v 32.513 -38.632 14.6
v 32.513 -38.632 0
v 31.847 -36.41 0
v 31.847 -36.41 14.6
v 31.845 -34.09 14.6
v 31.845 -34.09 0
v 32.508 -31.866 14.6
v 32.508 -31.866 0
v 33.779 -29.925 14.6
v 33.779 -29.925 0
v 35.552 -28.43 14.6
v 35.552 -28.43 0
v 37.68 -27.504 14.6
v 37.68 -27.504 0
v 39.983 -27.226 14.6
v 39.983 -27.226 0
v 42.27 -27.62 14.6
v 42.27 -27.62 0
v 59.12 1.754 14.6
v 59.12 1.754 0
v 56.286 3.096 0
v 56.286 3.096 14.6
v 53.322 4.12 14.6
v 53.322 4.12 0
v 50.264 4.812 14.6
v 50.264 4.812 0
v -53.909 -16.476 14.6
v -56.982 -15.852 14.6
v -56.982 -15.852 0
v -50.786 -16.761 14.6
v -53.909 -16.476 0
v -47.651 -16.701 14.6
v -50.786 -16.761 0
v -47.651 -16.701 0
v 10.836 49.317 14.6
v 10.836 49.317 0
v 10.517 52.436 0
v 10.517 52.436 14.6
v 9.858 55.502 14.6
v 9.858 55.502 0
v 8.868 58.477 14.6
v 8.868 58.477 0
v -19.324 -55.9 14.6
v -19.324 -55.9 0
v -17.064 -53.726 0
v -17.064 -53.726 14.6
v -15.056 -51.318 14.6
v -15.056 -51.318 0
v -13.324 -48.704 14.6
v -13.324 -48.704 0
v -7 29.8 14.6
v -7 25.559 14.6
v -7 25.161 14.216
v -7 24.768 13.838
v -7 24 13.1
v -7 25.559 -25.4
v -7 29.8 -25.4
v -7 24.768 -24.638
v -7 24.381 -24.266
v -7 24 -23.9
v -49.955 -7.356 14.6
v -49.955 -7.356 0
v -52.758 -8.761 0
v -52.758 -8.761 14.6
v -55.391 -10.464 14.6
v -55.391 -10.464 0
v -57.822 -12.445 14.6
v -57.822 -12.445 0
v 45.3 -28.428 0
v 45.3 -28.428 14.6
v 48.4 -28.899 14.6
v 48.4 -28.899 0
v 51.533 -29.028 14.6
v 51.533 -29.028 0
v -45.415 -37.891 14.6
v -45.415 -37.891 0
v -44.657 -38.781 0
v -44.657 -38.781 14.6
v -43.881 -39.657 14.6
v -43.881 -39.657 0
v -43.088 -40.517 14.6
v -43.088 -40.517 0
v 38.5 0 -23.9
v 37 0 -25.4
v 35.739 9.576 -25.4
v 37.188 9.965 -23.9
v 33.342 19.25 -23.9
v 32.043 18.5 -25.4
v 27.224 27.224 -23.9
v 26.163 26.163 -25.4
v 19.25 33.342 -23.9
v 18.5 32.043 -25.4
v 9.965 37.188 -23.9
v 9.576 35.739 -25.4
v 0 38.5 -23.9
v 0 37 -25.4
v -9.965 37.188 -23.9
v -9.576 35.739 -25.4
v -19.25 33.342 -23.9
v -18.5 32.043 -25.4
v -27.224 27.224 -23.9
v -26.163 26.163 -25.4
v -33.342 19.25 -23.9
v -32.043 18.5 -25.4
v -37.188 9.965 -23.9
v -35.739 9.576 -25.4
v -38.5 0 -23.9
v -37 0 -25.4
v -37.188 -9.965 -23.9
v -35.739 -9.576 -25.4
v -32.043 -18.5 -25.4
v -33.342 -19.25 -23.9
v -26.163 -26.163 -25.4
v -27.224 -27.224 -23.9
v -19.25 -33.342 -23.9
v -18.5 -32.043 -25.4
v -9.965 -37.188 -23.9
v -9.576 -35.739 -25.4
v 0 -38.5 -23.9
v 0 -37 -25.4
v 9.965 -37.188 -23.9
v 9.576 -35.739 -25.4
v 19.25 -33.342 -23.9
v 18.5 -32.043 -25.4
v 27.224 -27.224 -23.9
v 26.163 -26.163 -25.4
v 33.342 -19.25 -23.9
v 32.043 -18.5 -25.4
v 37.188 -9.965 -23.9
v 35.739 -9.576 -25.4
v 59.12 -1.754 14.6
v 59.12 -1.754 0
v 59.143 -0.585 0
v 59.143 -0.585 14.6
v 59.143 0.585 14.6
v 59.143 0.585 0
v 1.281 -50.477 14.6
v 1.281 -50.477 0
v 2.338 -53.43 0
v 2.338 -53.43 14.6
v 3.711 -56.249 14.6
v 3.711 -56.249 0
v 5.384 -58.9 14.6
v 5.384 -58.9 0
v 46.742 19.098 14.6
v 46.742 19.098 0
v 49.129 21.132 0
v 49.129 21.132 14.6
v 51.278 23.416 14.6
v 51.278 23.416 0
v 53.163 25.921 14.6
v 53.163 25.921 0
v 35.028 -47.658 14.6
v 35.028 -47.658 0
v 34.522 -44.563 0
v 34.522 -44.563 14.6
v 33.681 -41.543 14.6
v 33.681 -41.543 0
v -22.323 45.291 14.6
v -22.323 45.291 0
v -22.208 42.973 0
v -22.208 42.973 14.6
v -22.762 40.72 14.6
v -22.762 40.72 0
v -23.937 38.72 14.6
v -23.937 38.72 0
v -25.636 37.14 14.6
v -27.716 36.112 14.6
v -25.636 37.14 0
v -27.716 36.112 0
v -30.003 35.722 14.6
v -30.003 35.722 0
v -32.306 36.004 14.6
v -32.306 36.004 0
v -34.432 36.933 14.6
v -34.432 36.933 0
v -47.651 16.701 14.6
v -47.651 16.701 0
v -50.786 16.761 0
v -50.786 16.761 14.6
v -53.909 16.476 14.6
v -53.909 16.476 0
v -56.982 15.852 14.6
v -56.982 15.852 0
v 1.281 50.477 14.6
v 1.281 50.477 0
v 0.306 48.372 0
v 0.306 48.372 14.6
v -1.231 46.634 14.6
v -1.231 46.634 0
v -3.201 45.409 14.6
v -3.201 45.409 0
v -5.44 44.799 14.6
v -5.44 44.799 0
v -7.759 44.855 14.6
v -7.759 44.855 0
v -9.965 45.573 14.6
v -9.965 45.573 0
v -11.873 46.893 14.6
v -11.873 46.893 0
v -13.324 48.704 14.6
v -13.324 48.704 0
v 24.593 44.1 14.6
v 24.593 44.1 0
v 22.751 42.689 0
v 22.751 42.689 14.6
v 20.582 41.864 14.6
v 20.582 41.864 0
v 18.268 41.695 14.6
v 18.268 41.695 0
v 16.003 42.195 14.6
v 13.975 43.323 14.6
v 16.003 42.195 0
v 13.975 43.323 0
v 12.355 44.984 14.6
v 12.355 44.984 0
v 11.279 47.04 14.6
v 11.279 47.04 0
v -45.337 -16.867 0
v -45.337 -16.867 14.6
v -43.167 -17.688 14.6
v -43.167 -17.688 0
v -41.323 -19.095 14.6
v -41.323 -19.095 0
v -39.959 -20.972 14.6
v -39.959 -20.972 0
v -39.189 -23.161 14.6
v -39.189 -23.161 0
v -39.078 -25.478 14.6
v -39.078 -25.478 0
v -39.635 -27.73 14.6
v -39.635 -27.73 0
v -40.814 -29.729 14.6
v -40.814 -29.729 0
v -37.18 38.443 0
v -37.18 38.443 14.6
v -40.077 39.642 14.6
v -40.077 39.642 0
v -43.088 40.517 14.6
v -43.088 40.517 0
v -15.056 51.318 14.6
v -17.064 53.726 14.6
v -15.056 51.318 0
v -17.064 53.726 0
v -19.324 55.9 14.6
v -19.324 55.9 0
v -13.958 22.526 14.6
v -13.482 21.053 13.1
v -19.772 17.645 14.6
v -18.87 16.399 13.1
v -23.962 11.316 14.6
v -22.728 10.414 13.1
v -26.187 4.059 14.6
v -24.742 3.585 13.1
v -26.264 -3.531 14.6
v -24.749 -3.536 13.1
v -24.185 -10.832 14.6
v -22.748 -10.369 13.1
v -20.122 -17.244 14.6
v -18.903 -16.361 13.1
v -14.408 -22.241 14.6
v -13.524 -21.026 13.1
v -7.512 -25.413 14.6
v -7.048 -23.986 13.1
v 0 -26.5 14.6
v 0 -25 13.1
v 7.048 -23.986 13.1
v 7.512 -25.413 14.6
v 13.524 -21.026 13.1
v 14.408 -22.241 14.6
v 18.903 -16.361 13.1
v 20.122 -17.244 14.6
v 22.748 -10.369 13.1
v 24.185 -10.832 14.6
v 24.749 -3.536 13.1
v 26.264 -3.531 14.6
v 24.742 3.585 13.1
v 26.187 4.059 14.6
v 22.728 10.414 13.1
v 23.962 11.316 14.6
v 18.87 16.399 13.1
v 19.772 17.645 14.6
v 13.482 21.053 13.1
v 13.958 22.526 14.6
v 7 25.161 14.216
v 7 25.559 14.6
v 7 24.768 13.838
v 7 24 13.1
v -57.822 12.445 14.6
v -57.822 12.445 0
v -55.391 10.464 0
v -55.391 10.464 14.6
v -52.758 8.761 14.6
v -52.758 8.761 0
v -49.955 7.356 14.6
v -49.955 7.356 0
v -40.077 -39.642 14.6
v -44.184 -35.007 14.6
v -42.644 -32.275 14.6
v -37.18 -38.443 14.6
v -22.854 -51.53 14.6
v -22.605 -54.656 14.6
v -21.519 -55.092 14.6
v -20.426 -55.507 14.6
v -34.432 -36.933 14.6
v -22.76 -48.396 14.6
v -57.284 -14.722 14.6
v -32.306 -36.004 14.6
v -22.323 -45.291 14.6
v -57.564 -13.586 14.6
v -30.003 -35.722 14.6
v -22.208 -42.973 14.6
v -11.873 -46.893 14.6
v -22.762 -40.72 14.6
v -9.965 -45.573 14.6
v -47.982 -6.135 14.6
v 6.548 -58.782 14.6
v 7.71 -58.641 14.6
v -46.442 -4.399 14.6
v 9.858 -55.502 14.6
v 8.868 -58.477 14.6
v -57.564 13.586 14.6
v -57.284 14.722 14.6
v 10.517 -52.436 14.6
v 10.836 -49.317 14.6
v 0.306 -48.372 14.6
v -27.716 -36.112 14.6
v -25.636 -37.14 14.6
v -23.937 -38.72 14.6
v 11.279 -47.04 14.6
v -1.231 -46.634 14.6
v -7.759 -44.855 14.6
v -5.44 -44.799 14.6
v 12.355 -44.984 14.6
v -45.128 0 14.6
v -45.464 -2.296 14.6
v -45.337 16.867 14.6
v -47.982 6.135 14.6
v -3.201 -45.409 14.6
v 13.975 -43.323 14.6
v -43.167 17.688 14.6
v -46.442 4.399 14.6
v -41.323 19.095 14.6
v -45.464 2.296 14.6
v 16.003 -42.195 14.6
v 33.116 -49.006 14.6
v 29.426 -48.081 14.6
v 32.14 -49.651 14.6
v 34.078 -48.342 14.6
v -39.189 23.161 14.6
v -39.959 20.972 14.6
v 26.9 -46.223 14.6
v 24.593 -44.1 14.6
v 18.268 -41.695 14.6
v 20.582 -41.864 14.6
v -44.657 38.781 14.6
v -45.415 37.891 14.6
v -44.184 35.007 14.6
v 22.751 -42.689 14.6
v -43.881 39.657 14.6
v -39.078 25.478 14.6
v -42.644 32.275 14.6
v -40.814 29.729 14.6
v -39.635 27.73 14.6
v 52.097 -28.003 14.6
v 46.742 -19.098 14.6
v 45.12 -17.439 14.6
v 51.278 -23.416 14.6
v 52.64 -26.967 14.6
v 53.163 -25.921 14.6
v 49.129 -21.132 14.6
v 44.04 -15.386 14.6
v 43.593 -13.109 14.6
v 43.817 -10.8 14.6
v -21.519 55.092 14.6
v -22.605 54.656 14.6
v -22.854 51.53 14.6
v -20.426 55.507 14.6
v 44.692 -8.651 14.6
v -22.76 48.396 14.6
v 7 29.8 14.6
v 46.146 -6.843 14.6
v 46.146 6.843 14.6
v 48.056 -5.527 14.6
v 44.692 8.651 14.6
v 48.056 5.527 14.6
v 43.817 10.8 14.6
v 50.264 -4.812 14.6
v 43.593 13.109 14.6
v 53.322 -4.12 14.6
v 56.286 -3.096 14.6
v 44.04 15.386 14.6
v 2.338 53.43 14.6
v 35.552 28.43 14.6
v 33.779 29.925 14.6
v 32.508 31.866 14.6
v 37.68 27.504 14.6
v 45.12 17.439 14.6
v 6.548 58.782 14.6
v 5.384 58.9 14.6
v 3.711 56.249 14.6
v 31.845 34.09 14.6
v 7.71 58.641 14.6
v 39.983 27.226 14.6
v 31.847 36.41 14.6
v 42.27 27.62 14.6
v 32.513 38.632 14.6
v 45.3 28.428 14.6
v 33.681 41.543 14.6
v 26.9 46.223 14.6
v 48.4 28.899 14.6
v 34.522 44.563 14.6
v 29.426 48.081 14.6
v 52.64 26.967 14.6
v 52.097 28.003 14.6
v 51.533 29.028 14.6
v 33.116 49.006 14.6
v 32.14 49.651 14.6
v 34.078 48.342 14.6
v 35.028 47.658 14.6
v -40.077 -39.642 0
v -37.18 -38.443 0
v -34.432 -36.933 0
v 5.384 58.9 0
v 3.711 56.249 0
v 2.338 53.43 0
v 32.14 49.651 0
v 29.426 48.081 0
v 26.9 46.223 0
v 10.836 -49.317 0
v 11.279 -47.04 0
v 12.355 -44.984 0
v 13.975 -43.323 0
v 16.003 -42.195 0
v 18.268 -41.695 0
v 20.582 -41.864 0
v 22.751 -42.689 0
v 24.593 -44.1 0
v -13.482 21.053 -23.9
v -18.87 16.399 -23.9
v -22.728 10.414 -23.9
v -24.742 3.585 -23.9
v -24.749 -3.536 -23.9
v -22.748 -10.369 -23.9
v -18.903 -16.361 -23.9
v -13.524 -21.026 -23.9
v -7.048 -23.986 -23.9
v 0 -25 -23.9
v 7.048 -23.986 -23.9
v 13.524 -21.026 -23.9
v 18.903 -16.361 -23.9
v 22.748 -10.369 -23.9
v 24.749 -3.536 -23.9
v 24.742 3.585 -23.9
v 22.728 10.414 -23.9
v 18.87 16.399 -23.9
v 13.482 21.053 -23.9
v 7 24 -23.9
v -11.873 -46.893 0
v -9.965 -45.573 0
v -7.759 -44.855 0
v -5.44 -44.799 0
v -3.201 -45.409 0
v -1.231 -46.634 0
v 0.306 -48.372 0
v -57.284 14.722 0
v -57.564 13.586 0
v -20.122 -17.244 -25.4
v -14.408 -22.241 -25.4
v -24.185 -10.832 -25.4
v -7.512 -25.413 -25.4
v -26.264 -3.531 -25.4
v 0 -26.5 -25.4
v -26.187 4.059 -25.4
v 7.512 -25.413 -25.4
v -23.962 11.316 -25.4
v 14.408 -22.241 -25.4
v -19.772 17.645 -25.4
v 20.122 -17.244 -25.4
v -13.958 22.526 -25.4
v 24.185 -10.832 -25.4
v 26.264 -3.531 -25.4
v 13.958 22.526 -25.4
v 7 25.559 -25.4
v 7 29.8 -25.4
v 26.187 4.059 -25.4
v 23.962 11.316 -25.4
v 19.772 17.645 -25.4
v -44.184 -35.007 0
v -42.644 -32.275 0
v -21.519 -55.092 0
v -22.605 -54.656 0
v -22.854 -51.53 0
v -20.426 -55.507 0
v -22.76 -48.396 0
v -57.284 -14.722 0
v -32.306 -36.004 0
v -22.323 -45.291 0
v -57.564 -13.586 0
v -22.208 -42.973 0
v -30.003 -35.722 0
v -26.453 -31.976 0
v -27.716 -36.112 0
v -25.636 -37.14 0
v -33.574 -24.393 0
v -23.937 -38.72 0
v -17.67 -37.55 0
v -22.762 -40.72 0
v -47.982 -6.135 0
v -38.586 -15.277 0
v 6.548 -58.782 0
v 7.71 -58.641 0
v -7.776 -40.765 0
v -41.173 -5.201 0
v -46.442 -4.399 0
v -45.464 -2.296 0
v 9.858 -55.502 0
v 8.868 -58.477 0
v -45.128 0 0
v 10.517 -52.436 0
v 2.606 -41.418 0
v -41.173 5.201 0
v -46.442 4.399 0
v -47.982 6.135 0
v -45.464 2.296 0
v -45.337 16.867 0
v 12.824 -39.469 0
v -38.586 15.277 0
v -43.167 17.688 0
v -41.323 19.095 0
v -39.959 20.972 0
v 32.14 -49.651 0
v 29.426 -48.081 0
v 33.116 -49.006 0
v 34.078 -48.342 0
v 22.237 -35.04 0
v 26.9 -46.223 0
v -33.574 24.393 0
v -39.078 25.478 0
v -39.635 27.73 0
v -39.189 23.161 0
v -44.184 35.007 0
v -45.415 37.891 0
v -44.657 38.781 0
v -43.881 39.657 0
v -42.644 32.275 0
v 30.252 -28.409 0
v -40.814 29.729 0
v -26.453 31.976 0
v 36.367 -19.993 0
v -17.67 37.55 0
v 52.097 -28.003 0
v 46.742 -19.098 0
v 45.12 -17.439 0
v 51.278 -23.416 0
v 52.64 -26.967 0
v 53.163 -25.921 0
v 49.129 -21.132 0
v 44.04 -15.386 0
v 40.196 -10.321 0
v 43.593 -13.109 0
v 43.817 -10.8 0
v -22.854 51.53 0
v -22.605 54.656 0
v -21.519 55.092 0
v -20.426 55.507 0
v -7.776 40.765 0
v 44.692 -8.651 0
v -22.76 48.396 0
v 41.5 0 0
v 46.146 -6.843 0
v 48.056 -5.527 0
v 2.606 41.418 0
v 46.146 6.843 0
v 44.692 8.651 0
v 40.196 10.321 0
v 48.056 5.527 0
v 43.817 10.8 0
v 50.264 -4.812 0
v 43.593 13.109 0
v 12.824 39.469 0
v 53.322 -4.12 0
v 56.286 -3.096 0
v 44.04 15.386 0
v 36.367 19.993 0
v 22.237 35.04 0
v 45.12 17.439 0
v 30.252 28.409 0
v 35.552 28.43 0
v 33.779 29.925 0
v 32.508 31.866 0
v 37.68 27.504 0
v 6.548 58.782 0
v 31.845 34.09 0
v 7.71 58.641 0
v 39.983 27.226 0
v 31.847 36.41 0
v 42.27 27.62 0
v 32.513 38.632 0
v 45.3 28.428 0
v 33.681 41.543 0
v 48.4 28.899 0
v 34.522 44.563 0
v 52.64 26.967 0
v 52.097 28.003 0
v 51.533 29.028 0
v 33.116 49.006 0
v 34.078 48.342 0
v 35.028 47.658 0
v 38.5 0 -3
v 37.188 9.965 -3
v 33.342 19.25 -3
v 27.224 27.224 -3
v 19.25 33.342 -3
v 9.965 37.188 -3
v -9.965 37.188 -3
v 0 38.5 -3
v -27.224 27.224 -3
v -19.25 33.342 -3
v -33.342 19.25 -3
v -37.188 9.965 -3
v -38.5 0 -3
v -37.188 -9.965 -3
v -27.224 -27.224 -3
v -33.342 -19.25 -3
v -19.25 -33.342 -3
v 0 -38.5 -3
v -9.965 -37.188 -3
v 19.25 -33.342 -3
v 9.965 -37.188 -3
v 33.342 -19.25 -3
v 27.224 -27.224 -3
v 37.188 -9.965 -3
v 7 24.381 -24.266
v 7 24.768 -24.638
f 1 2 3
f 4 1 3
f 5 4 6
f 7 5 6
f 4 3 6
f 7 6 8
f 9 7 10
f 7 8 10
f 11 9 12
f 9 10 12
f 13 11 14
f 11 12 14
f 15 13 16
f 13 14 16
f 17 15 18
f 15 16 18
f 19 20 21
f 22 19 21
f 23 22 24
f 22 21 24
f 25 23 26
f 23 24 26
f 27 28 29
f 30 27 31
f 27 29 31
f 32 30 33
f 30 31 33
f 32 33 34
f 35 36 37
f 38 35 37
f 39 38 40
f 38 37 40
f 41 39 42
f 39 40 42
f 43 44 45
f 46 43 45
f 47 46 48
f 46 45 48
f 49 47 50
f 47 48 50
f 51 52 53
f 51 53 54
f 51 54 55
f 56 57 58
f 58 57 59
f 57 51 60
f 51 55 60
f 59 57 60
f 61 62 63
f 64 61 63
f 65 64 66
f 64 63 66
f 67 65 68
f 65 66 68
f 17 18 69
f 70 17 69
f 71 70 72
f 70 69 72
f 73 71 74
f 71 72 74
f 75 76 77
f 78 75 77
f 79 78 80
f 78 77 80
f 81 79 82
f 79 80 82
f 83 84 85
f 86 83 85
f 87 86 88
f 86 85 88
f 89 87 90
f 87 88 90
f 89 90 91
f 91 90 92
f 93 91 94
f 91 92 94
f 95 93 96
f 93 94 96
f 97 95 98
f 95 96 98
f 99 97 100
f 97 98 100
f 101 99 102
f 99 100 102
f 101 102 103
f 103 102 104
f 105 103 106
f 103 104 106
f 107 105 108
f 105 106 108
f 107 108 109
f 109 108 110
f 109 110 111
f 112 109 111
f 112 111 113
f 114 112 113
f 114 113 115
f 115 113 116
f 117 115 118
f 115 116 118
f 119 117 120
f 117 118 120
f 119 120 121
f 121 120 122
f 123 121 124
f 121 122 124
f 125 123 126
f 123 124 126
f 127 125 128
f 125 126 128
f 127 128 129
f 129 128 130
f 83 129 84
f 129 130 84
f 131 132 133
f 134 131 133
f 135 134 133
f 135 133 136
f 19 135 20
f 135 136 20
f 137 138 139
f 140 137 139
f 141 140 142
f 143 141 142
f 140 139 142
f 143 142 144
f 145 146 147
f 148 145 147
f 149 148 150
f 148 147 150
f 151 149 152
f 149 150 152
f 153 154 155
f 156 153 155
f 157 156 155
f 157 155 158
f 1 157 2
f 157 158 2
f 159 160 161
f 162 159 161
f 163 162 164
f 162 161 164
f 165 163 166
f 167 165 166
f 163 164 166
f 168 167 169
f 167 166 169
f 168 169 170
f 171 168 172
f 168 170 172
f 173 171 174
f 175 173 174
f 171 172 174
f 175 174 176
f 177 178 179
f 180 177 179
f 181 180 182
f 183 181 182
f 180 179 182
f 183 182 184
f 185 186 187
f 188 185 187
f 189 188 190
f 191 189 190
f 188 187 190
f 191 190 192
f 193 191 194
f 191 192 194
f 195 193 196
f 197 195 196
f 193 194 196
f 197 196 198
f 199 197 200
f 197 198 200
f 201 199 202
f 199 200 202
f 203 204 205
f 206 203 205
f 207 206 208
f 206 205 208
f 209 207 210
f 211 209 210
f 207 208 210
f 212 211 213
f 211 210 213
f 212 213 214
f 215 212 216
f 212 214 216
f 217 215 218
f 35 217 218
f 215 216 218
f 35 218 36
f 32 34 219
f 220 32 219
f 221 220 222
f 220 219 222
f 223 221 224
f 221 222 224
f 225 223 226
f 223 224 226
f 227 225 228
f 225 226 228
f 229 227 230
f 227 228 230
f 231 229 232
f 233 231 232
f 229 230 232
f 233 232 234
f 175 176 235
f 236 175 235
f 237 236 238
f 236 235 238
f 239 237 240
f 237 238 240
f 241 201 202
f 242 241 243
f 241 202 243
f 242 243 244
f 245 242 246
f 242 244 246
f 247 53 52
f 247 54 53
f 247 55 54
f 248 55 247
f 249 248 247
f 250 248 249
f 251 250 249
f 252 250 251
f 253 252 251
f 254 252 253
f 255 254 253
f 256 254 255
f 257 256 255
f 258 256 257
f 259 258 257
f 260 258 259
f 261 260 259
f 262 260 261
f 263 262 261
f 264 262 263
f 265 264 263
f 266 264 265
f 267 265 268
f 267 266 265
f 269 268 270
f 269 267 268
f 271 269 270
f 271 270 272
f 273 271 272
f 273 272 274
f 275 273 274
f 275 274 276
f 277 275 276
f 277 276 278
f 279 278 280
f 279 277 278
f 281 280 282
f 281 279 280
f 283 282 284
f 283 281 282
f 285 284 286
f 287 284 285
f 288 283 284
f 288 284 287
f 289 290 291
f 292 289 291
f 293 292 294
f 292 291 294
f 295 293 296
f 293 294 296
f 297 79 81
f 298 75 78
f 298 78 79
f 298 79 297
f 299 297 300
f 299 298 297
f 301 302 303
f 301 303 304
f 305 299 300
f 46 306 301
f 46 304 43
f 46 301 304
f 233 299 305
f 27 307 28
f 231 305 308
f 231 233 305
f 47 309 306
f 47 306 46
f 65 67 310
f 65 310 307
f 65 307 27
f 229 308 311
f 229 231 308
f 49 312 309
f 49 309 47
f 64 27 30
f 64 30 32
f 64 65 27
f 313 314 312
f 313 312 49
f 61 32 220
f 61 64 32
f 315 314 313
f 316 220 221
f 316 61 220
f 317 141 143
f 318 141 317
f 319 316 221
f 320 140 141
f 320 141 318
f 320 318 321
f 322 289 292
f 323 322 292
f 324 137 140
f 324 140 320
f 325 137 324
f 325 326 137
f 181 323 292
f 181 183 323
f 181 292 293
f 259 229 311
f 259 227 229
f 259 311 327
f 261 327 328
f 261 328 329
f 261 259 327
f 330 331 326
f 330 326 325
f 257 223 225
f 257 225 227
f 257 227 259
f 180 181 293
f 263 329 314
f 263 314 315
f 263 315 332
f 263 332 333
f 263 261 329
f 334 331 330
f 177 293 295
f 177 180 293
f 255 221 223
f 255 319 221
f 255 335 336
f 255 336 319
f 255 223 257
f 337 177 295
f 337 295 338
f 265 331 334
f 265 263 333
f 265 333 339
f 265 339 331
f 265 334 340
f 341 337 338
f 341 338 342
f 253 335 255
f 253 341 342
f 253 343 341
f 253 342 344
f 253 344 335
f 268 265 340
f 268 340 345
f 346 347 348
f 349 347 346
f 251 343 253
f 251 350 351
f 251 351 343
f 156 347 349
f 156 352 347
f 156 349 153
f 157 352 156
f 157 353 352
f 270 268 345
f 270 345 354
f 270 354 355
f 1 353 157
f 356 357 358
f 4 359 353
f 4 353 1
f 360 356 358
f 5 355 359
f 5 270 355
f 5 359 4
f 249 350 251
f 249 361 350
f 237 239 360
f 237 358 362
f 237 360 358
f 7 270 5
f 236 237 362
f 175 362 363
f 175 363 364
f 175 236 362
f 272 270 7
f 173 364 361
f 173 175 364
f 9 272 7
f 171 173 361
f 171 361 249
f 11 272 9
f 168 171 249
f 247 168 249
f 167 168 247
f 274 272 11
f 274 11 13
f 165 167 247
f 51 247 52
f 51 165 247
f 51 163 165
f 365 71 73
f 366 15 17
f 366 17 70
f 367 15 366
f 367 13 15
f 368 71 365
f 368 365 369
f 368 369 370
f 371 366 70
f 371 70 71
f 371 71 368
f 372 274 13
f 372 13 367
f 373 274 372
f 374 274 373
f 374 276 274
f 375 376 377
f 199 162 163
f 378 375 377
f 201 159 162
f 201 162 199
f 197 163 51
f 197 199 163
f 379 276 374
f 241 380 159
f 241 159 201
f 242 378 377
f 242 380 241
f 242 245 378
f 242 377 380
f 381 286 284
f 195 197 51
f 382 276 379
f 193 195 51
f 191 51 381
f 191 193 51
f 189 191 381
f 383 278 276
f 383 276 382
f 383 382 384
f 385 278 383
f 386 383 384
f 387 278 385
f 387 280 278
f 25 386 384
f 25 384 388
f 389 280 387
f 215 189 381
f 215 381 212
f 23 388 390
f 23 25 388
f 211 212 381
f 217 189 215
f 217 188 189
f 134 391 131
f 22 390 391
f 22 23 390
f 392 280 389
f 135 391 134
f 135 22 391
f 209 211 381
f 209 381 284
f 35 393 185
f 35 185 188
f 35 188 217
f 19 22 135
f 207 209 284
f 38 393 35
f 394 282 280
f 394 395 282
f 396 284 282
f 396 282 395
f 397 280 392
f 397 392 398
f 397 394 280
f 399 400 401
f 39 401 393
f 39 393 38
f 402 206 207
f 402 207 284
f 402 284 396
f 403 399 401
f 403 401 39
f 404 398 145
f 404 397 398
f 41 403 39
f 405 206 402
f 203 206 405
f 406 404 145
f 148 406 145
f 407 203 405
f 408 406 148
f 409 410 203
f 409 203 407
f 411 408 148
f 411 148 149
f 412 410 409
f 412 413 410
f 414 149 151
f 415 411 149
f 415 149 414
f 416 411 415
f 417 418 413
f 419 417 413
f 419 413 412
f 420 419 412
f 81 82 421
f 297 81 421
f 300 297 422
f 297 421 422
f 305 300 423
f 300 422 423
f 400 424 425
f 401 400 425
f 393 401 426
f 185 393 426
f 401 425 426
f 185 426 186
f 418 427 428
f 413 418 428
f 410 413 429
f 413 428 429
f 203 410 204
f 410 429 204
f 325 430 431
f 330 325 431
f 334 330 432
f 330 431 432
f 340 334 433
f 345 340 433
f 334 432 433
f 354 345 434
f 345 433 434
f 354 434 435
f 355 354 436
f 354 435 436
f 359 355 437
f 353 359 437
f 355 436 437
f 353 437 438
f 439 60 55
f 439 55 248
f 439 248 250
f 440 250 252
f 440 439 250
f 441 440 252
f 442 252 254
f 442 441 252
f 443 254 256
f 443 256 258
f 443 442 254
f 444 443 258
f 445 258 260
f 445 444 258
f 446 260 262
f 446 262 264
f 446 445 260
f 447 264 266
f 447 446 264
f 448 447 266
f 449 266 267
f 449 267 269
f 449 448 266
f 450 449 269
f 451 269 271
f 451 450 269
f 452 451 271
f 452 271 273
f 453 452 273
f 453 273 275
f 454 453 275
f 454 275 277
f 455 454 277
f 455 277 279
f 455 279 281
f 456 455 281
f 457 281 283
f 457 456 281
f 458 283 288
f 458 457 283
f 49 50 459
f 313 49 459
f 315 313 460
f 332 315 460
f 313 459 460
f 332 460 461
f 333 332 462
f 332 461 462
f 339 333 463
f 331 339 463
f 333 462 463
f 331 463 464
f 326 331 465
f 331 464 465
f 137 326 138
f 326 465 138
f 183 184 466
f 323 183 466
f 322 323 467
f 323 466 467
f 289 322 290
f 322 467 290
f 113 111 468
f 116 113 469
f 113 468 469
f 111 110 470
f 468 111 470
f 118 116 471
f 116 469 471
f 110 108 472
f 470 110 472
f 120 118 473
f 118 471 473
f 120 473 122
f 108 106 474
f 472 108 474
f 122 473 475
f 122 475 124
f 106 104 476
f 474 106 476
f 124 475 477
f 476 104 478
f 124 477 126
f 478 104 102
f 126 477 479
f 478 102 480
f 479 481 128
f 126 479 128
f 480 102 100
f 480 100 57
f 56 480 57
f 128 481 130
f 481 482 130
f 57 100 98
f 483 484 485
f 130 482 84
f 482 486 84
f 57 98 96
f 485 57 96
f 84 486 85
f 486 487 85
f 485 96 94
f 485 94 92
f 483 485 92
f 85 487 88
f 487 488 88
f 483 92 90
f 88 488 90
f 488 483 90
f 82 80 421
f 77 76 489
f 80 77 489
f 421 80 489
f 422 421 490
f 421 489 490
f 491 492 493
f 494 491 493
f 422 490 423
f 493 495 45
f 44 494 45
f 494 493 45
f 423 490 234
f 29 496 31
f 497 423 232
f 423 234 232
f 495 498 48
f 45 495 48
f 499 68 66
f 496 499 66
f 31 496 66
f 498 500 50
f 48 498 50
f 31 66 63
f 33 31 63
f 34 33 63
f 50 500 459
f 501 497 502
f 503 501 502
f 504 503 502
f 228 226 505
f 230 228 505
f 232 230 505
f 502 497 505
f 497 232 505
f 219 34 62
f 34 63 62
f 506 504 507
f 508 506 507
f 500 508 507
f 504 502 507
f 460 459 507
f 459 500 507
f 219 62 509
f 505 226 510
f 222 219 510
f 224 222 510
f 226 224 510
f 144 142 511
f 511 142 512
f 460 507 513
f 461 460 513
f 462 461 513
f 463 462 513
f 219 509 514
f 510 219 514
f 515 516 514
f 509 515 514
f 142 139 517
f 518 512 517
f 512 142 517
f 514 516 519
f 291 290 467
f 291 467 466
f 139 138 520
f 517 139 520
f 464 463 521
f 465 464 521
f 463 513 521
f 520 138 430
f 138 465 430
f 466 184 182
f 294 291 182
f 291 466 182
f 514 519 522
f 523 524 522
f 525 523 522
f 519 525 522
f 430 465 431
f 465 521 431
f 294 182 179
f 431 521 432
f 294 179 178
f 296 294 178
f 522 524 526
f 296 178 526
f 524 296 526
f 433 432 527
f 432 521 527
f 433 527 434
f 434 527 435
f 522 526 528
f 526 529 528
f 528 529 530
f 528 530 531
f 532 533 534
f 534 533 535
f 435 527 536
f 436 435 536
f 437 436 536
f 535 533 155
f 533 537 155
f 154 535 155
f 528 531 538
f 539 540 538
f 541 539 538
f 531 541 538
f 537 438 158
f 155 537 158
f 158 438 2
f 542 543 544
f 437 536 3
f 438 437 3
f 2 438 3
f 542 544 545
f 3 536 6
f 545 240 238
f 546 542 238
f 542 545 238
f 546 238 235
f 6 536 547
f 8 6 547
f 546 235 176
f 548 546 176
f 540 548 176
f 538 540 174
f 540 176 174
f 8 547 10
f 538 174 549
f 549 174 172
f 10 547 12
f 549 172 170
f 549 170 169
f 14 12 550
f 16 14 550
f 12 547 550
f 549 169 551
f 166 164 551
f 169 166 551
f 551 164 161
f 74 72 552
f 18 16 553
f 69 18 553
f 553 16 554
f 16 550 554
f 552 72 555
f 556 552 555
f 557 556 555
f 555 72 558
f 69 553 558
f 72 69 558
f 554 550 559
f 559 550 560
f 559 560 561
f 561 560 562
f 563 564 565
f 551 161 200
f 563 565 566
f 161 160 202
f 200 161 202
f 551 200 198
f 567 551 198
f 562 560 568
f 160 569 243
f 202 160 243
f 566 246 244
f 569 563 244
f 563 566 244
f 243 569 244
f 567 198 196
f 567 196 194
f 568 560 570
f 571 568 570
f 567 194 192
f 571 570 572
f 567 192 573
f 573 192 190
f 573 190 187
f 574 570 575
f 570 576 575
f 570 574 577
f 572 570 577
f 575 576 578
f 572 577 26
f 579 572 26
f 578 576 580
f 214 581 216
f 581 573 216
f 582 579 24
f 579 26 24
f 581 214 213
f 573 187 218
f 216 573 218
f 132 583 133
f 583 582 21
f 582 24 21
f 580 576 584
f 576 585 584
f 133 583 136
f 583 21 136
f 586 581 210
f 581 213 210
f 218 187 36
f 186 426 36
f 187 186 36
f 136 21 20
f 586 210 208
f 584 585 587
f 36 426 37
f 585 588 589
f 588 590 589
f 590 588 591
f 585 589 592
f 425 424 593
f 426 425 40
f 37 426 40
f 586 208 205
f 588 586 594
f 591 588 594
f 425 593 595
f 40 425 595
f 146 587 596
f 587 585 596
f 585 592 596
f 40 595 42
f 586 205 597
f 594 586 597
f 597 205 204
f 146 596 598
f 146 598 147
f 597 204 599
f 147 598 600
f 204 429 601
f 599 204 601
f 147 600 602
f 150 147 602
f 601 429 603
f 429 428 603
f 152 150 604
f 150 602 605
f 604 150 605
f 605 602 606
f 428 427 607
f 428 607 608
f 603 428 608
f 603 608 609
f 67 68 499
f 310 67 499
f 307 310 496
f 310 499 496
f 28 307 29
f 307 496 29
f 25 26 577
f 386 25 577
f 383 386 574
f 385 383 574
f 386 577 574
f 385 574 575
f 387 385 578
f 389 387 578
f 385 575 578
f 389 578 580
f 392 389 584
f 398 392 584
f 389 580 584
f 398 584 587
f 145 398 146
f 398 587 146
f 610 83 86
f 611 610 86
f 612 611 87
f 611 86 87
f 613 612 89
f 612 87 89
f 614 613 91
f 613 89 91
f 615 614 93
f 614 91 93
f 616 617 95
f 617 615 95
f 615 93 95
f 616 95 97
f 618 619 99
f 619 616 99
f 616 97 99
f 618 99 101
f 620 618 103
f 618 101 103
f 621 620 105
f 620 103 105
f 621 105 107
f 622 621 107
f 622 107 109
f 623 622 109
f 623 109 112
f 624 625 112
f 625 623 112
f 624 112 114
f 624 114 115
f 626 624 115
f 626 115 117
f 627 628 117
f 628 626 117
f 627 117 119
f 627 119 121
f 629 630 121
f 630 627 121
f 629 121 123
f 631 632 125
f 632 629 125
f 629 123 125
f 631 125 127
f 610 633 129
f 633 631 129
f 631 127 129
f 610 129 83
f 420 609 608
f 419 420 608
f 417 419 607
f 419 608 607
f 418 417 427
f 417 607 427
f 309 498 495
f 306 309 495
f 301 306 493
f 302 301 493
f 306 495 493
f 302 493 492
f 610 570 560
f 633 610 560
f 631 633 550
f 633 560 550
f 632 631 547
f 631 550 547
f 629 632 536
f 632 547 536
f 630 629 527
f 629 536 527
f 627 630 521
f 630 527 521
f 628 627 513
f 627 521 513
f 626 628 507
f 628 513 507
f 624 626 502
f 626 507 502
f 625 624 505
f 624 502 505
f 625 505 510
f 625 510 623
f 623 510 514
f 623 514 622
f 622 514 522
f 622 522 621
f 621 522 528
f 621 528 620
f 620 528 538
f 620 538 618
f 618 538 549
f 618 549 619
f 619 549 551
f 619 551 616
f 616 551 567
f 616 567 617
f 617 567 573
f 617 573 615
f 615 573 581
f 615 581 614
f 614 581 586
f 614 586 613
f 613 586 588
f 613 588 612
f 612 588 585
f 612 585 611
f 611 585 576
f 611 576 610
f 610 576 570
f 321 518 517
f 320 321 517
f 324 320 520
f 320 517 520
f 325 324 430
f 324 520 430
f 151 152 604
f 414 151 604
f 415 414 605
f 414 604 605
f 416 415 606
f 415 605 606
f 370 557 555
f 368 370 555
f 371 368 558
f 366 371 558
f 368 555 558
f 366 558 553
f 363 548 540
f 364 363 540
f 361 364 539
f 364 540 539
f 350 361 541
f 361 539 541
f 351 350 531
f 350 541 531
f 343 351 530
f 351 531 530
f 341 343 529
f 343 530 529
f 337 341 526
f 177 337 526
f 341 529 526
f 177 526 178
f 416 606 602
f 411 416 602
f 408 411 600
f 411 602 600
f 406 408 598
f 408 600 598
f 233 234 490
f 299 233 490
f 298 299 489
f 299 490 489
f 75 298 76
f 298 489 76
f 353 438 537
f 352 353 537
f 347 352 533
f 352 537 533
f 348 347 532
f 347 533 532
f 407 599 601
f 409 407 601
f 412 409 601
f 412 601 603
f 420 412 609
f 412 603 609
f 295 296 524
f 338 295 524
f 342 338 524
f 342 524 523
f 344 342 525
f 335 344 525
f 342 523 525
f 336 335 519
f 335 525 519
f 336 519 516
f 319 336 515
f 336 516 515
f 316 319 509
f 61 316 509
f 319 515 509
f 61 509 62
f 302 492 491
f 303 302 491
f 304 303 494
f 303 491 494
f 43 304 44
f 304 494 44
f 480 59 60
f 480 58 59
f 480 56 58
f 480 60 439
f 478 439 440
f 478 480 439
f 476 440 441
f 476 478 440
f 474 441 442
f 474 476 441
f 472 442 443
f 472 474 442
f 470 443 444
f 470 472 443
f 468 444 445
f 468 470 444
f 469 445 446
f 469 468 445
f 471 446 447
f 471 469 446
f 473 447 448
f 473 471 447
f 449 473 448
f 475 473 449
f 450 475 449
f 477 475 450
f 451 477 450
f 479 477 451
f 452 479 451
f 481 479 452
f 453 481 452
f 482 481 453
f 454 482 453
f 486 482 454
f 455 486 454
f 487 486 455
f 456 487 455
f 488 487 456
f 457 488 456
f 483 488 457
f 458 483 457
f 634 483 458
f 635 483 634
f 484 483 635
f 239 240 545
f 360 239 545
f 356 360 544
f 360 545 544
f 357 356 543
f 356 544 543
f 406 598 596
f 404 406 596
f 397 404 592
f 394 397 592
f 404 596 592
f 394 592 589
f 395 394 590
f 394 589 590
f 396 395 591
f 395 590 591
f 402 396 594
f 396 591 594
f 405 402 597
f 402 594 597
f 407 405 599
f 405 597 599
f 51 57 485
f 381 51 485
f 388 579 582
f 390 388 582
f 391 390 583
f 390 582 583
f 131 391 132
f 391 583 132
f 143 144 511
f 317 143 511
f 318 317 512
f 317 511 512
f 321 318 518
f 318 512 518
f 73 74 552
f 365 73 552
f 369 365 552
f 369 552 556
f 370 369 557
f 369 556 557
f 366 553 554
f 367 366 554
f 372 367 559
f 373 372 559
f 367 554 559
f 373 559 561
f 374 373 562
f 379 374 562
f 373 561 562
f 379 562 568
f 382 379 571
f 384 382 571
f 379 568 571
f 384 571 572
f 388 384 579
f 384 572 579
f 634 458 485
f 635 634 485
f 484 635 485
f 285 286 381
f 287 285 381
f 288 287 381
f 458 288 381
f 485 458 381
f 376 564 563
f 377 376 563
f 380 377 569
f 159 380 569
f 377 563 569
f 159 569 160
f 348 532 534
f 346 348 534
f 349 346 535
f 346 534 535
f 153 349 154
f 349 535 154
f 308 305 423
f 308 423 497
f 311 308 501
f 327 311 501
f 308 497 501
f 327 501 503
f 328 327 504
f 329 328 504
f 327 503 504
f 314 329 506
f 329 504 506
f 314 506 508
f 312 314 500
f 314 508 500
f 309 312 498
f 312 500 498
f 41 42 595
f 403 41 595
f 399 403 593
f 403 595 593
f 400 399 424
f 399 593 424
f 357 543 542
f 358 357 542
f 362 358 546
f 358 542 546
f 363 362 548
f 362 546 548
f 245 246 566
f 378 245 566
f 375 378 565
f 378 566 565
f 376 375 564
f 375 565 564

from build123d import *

# Parameters (mm, degrees)
SKETCH2_R           = 25
BOSS_EXTRUDE1_DEPTH = 14.6
BOSS_EXTRUDE2_START = -40
SKETCH3_R           = 38.5
SKETCH3_R_2         = 25
BOSS_EXTRUDE2_DEPTH = 40
SKETCH4_W           = 14
SKETCH4_H           = 9
CUT_EXTRUDE1_DEPTH  = 45
MOVE_FACE1_BY       = 0.3
CHAMFER3_SIZE       = 1.5
CHAMFER4_SIZE       = 3


with BuildPart() as part:
    # Sketch2 → Boss-Extrude1 (new body)
    with BuildSketch(Plane.XY):
        with BuildLine():
            ThreePointArc((53.163386549, 25.920934205), (52.371116098, 27.486482097), (51.532756355, 29.027840461))
            ThreePointArc((51.532756355, 29.027840461), (46.843166468, 28.705871605), (42.269756881, 27.619666278))
            ThreePointArc((42.269756881, 27.619666278), (33.778781557, 29.925389145), (32.513343984, 38.632379879))
            ThreePointArc((32.513343984, 38.632379879), (34.14289326, 43.041516576), (35.027782197, 47.658105016))
            ThreePointArc((35.027782197, 47.658105016), (33.598715171, 48.676142393), (32.140079536, 49.651342246))
            ThreePointArc((32.140079536, 49.651342246), (28.137280301, 47.186891894), (24.59251201, 44.099735432))
            ThreePointArc((24.59251201, 44.099735432), (16.002603901, 42.195398652), (10.835774224, 49.316977899))
            ThreePointArc((10.835774224, 49.316977899), (10.229640458, 53.978363864), (8.867735075, 58.47737831))
            ThreePointArc((8.867735075, 58.47737831), (7.129253506, 58.714685078), (5.384497826, 58.900319885))
            ThreePointArc((5.384497826, 58.900319885), (2.985482308, 54.857963913), (1.281419009, 50.477086658))
            ThreePointArc((1.281419009, 50.477086658), (-5.439577457, 44.798950837), (-13.324140826, 48.703650616))
            ThreePointArc((-13.324140826, 48.703650616), (-16.027099693, 52.549418501), (-19.323803285, 55.900188962))
            ThreePointArc((-19.323803285, 55.900188962), (-20.973434219, 55.302401001), (-22.604607447, 54.655944065))
            ThreePointArc((-22.604607447, 54.655944065), (-22.850253703, 49.96173751), (-22.323231644, 45.290745645))
            ThreePointArc((-22.323231644, 45.290745645), (-25.635617173, 37.139603271), (-34.431655785, 36.93290392))
            ThreePointArc((-34.431655785, 36.93290392), (-38.612224452, 39.082034648), (-43.08849119, 40.516939993))
            ThreePointArc((-43.08849119, 40.516939993), (-44.271360923, 39.22100332), (-45.415269568, 37.890550135))
            ThreePointArc((-45.415269568, 37.890550135), (-43.451271965, 33.619879148), (-40.813898952, 29.728840617))
            ThreePointArc((-40.813898952, 29.728840617), (-39.958845938, 20.972020177), (-47.651293351, 16.701274026))
            ThreePointArc((-47.651293351, 16.701274026), (-52.351753916, 16.661427647), (-56.982125035, 15.851748354))
            ThreePointArc((-56.982125035, 15.851748354), (-57.427252367, 14.154546443), (-57.821840745, 12.444887799))
            ThreePointArc((-57.821840745, 12.444887799), (-54.098127465, 9.576111636), (-49.95459387, 7.356416476))
            ThreePointArc((-49.95459387, 7.356416476), (-45.127984655, 0), (-49.95459387, -7.356416476))
            ThreePointArc((-49.95459387, -7.356416476), (-54.098127465, -9.576111636), (-57.821840745, -12.444887799))
            ThreePointArc((-57.821840745, -12.444887799), (-57.427252367, -14.154546443), (-56.982125035, -15.851748354))
            ThreePointArc((-56.982125035, -15.851748354), (-52.351753916, -16.661427647), (-47.651293351, -16.701274026))
            ThreePointArc((-47.651293351, -16.701274026), (-39.958845938, -20.972020177), (-40.813898952, -29.728840617))
            ThreePointArc((-40.813898952, -29.728840617), (-43.451271965, -33.619879148), (-45.415269568, -37.890550135))
            ThreePointArc((-45.415269568, -37.890550135), (-44.271360923, -39.22100332), (-43.08849119, -40.516939993))
            ThreePointArc((-43.08849119, -40.516939993), (-38.612224452, -39.082034648), (-34.431655785, -36.93290392))
            ThreePointArc((-34.431655785, -36.93290392), (-25.635617173, -37.139603271), (-22.323231644, -45.290745645))
            ThreePointArc((-22.323231644, -45.290745645), (-22.850253703, -49.96173751), (-22.604607446, -54.655944065))
            ThreePointArc((-22.604607446, -54.655944065), (-20.973434219, -55.302401001), (-19.323803285, -55.900188962))
            ThreePointArc((-19.323803285, -55.900188962), (-16.027099693, -52.549418501), (-13.324140826, -48.703650616))
            ThreePointArc((-13.324140826, -48.703650616), (-5.439577457, -44.798950837), (1.281419009, -50.477086658))
            ThreePointArc((1.281419009, -50.477086658), (2.985482308, -54.857963913), (5.384497826, -58.900319885))
            ThreePointArc((5.384497826, -58.900319885), (7.129253506, -58.714685078), (8.867735075, -58.47737831))
            ThreePointArc((8.867735075, -58.47737831), (10.229640457, -53.978363864), (10.835774224, -49.316977899))
            ThreePointArc((10.835774224, -49.316977899), (16.002603901, -42.195398652), (24.59251201, -44.099735432))
            ThreePointArc((24.59251201, -44.099735432), (28.137280301, -47.186891894), (32.140079536, -49.651342246))
            ThreePointArc((32.140079536, -49.651342246), (33.598715171, -48.676142393), (35.027782197, -47.658105016))
            ThreePointArc((35.027782197, -47.658105016), (34.14289326, -43.041516576), (32.513343984, -38.632379879))
            ThreePointArc((32.513343984, -38.632379879), (33.778781557, -29.925389145), (42.269756881, -27.619666278))
            ThreePointArc((42.269756881, -27.619666278), (46.843166468, -28.705871605), (51.532756355, -29.027840461))
            ThreePointArc((51.532756355, -29.027840461), (52.371116098, -27.486482097), (53.163386549, -25.920934206))
            ThreePointArc((53.163386549, -25.920934206), (50.234420683, -22.244376547), (46.742498465, -19.097569199))
            ThreePointArc((46.742498465, -19.097569199), (43.816647437, -10.799833626), (50.263509857, -4.812264433))
            ThreePointArc((50.263509857, -4.812264433), (54.817847718, -3.648682075), (59.11989973, -1.754410251))
            ThreePointArc((59.11989973, -1.754410251), (59.145925468, 0), (59.11989973, 1.754410251))
            ThreePointArc((59.11989973, 1.754410251), (54.817847718, 3.648682075), (50.263509857, 4.812264433))
            ThreePointArc((50.263509857, 4.812264433), (43.816647437, 10.799833626), (46.742498465, 19.097569199))
            ThreePointArc((46.742498465, 19.097569199), (50.234420683, 22.244376547), (53.163386549, 25.920934205))
        make_face()
        Circle(SKETCH2_R, mode=Mode.SUBTRACT)
    extrude(amount=BOSS_EXTRUDE1_DEPTH)

    # Sketch3 → Boss-Extrude2 (add)
    with BuildSketch(Plane.XY.offset(14.6).offset(BOSS_EXTRUDE2_START)):
        Circle(SKETCH3_R)
        Circle(SKETCH3_R_2, mode=Mode.SUBTRACT)
    extrude(amount=BOSS_EXTRUDE2_DEPTH)

    # Sketch4 → Cut-Extrude1 (cut)
    with BuildSketch(Plane.XY.offset(14.6)):
        with Locations((0, 25)):
            Rectangle(SKETCH4_W, SKETCH4_H)
    extrude(amount=-CUT_EXTRUDE1_DEPTH, mode=Mode.SUBTRACT)

    # Move Face1: a face moved inward by 0.3
    extrude(part.faces().sort_by_distance((0, 29.5, -5.4))[0], amount=MOVE_FACE1_BY, dir=(0, 1, 0), mode=Mode.SUBTRACT)

    # Chamfer3
    chamfer3_edges = [part.edges().sort_by_distance(p)[0] for p in [
        (-38.5, 0, -25.4),
        (0, -25, -25.4),
        (0, -25, 14.6),
    ]]
    chamfer(chamfer3_edges, length=CHAMFER3_SIZE)

    # Chamfer4
    chamfer4_edges = [part.edges().sort_by_distance(p)[0] for p in [
        (-38.5, 0, 0),
    ]]
    chamfer(chamfer4_edges, length=CHAMFER4_SIZE)


solid = part.part
